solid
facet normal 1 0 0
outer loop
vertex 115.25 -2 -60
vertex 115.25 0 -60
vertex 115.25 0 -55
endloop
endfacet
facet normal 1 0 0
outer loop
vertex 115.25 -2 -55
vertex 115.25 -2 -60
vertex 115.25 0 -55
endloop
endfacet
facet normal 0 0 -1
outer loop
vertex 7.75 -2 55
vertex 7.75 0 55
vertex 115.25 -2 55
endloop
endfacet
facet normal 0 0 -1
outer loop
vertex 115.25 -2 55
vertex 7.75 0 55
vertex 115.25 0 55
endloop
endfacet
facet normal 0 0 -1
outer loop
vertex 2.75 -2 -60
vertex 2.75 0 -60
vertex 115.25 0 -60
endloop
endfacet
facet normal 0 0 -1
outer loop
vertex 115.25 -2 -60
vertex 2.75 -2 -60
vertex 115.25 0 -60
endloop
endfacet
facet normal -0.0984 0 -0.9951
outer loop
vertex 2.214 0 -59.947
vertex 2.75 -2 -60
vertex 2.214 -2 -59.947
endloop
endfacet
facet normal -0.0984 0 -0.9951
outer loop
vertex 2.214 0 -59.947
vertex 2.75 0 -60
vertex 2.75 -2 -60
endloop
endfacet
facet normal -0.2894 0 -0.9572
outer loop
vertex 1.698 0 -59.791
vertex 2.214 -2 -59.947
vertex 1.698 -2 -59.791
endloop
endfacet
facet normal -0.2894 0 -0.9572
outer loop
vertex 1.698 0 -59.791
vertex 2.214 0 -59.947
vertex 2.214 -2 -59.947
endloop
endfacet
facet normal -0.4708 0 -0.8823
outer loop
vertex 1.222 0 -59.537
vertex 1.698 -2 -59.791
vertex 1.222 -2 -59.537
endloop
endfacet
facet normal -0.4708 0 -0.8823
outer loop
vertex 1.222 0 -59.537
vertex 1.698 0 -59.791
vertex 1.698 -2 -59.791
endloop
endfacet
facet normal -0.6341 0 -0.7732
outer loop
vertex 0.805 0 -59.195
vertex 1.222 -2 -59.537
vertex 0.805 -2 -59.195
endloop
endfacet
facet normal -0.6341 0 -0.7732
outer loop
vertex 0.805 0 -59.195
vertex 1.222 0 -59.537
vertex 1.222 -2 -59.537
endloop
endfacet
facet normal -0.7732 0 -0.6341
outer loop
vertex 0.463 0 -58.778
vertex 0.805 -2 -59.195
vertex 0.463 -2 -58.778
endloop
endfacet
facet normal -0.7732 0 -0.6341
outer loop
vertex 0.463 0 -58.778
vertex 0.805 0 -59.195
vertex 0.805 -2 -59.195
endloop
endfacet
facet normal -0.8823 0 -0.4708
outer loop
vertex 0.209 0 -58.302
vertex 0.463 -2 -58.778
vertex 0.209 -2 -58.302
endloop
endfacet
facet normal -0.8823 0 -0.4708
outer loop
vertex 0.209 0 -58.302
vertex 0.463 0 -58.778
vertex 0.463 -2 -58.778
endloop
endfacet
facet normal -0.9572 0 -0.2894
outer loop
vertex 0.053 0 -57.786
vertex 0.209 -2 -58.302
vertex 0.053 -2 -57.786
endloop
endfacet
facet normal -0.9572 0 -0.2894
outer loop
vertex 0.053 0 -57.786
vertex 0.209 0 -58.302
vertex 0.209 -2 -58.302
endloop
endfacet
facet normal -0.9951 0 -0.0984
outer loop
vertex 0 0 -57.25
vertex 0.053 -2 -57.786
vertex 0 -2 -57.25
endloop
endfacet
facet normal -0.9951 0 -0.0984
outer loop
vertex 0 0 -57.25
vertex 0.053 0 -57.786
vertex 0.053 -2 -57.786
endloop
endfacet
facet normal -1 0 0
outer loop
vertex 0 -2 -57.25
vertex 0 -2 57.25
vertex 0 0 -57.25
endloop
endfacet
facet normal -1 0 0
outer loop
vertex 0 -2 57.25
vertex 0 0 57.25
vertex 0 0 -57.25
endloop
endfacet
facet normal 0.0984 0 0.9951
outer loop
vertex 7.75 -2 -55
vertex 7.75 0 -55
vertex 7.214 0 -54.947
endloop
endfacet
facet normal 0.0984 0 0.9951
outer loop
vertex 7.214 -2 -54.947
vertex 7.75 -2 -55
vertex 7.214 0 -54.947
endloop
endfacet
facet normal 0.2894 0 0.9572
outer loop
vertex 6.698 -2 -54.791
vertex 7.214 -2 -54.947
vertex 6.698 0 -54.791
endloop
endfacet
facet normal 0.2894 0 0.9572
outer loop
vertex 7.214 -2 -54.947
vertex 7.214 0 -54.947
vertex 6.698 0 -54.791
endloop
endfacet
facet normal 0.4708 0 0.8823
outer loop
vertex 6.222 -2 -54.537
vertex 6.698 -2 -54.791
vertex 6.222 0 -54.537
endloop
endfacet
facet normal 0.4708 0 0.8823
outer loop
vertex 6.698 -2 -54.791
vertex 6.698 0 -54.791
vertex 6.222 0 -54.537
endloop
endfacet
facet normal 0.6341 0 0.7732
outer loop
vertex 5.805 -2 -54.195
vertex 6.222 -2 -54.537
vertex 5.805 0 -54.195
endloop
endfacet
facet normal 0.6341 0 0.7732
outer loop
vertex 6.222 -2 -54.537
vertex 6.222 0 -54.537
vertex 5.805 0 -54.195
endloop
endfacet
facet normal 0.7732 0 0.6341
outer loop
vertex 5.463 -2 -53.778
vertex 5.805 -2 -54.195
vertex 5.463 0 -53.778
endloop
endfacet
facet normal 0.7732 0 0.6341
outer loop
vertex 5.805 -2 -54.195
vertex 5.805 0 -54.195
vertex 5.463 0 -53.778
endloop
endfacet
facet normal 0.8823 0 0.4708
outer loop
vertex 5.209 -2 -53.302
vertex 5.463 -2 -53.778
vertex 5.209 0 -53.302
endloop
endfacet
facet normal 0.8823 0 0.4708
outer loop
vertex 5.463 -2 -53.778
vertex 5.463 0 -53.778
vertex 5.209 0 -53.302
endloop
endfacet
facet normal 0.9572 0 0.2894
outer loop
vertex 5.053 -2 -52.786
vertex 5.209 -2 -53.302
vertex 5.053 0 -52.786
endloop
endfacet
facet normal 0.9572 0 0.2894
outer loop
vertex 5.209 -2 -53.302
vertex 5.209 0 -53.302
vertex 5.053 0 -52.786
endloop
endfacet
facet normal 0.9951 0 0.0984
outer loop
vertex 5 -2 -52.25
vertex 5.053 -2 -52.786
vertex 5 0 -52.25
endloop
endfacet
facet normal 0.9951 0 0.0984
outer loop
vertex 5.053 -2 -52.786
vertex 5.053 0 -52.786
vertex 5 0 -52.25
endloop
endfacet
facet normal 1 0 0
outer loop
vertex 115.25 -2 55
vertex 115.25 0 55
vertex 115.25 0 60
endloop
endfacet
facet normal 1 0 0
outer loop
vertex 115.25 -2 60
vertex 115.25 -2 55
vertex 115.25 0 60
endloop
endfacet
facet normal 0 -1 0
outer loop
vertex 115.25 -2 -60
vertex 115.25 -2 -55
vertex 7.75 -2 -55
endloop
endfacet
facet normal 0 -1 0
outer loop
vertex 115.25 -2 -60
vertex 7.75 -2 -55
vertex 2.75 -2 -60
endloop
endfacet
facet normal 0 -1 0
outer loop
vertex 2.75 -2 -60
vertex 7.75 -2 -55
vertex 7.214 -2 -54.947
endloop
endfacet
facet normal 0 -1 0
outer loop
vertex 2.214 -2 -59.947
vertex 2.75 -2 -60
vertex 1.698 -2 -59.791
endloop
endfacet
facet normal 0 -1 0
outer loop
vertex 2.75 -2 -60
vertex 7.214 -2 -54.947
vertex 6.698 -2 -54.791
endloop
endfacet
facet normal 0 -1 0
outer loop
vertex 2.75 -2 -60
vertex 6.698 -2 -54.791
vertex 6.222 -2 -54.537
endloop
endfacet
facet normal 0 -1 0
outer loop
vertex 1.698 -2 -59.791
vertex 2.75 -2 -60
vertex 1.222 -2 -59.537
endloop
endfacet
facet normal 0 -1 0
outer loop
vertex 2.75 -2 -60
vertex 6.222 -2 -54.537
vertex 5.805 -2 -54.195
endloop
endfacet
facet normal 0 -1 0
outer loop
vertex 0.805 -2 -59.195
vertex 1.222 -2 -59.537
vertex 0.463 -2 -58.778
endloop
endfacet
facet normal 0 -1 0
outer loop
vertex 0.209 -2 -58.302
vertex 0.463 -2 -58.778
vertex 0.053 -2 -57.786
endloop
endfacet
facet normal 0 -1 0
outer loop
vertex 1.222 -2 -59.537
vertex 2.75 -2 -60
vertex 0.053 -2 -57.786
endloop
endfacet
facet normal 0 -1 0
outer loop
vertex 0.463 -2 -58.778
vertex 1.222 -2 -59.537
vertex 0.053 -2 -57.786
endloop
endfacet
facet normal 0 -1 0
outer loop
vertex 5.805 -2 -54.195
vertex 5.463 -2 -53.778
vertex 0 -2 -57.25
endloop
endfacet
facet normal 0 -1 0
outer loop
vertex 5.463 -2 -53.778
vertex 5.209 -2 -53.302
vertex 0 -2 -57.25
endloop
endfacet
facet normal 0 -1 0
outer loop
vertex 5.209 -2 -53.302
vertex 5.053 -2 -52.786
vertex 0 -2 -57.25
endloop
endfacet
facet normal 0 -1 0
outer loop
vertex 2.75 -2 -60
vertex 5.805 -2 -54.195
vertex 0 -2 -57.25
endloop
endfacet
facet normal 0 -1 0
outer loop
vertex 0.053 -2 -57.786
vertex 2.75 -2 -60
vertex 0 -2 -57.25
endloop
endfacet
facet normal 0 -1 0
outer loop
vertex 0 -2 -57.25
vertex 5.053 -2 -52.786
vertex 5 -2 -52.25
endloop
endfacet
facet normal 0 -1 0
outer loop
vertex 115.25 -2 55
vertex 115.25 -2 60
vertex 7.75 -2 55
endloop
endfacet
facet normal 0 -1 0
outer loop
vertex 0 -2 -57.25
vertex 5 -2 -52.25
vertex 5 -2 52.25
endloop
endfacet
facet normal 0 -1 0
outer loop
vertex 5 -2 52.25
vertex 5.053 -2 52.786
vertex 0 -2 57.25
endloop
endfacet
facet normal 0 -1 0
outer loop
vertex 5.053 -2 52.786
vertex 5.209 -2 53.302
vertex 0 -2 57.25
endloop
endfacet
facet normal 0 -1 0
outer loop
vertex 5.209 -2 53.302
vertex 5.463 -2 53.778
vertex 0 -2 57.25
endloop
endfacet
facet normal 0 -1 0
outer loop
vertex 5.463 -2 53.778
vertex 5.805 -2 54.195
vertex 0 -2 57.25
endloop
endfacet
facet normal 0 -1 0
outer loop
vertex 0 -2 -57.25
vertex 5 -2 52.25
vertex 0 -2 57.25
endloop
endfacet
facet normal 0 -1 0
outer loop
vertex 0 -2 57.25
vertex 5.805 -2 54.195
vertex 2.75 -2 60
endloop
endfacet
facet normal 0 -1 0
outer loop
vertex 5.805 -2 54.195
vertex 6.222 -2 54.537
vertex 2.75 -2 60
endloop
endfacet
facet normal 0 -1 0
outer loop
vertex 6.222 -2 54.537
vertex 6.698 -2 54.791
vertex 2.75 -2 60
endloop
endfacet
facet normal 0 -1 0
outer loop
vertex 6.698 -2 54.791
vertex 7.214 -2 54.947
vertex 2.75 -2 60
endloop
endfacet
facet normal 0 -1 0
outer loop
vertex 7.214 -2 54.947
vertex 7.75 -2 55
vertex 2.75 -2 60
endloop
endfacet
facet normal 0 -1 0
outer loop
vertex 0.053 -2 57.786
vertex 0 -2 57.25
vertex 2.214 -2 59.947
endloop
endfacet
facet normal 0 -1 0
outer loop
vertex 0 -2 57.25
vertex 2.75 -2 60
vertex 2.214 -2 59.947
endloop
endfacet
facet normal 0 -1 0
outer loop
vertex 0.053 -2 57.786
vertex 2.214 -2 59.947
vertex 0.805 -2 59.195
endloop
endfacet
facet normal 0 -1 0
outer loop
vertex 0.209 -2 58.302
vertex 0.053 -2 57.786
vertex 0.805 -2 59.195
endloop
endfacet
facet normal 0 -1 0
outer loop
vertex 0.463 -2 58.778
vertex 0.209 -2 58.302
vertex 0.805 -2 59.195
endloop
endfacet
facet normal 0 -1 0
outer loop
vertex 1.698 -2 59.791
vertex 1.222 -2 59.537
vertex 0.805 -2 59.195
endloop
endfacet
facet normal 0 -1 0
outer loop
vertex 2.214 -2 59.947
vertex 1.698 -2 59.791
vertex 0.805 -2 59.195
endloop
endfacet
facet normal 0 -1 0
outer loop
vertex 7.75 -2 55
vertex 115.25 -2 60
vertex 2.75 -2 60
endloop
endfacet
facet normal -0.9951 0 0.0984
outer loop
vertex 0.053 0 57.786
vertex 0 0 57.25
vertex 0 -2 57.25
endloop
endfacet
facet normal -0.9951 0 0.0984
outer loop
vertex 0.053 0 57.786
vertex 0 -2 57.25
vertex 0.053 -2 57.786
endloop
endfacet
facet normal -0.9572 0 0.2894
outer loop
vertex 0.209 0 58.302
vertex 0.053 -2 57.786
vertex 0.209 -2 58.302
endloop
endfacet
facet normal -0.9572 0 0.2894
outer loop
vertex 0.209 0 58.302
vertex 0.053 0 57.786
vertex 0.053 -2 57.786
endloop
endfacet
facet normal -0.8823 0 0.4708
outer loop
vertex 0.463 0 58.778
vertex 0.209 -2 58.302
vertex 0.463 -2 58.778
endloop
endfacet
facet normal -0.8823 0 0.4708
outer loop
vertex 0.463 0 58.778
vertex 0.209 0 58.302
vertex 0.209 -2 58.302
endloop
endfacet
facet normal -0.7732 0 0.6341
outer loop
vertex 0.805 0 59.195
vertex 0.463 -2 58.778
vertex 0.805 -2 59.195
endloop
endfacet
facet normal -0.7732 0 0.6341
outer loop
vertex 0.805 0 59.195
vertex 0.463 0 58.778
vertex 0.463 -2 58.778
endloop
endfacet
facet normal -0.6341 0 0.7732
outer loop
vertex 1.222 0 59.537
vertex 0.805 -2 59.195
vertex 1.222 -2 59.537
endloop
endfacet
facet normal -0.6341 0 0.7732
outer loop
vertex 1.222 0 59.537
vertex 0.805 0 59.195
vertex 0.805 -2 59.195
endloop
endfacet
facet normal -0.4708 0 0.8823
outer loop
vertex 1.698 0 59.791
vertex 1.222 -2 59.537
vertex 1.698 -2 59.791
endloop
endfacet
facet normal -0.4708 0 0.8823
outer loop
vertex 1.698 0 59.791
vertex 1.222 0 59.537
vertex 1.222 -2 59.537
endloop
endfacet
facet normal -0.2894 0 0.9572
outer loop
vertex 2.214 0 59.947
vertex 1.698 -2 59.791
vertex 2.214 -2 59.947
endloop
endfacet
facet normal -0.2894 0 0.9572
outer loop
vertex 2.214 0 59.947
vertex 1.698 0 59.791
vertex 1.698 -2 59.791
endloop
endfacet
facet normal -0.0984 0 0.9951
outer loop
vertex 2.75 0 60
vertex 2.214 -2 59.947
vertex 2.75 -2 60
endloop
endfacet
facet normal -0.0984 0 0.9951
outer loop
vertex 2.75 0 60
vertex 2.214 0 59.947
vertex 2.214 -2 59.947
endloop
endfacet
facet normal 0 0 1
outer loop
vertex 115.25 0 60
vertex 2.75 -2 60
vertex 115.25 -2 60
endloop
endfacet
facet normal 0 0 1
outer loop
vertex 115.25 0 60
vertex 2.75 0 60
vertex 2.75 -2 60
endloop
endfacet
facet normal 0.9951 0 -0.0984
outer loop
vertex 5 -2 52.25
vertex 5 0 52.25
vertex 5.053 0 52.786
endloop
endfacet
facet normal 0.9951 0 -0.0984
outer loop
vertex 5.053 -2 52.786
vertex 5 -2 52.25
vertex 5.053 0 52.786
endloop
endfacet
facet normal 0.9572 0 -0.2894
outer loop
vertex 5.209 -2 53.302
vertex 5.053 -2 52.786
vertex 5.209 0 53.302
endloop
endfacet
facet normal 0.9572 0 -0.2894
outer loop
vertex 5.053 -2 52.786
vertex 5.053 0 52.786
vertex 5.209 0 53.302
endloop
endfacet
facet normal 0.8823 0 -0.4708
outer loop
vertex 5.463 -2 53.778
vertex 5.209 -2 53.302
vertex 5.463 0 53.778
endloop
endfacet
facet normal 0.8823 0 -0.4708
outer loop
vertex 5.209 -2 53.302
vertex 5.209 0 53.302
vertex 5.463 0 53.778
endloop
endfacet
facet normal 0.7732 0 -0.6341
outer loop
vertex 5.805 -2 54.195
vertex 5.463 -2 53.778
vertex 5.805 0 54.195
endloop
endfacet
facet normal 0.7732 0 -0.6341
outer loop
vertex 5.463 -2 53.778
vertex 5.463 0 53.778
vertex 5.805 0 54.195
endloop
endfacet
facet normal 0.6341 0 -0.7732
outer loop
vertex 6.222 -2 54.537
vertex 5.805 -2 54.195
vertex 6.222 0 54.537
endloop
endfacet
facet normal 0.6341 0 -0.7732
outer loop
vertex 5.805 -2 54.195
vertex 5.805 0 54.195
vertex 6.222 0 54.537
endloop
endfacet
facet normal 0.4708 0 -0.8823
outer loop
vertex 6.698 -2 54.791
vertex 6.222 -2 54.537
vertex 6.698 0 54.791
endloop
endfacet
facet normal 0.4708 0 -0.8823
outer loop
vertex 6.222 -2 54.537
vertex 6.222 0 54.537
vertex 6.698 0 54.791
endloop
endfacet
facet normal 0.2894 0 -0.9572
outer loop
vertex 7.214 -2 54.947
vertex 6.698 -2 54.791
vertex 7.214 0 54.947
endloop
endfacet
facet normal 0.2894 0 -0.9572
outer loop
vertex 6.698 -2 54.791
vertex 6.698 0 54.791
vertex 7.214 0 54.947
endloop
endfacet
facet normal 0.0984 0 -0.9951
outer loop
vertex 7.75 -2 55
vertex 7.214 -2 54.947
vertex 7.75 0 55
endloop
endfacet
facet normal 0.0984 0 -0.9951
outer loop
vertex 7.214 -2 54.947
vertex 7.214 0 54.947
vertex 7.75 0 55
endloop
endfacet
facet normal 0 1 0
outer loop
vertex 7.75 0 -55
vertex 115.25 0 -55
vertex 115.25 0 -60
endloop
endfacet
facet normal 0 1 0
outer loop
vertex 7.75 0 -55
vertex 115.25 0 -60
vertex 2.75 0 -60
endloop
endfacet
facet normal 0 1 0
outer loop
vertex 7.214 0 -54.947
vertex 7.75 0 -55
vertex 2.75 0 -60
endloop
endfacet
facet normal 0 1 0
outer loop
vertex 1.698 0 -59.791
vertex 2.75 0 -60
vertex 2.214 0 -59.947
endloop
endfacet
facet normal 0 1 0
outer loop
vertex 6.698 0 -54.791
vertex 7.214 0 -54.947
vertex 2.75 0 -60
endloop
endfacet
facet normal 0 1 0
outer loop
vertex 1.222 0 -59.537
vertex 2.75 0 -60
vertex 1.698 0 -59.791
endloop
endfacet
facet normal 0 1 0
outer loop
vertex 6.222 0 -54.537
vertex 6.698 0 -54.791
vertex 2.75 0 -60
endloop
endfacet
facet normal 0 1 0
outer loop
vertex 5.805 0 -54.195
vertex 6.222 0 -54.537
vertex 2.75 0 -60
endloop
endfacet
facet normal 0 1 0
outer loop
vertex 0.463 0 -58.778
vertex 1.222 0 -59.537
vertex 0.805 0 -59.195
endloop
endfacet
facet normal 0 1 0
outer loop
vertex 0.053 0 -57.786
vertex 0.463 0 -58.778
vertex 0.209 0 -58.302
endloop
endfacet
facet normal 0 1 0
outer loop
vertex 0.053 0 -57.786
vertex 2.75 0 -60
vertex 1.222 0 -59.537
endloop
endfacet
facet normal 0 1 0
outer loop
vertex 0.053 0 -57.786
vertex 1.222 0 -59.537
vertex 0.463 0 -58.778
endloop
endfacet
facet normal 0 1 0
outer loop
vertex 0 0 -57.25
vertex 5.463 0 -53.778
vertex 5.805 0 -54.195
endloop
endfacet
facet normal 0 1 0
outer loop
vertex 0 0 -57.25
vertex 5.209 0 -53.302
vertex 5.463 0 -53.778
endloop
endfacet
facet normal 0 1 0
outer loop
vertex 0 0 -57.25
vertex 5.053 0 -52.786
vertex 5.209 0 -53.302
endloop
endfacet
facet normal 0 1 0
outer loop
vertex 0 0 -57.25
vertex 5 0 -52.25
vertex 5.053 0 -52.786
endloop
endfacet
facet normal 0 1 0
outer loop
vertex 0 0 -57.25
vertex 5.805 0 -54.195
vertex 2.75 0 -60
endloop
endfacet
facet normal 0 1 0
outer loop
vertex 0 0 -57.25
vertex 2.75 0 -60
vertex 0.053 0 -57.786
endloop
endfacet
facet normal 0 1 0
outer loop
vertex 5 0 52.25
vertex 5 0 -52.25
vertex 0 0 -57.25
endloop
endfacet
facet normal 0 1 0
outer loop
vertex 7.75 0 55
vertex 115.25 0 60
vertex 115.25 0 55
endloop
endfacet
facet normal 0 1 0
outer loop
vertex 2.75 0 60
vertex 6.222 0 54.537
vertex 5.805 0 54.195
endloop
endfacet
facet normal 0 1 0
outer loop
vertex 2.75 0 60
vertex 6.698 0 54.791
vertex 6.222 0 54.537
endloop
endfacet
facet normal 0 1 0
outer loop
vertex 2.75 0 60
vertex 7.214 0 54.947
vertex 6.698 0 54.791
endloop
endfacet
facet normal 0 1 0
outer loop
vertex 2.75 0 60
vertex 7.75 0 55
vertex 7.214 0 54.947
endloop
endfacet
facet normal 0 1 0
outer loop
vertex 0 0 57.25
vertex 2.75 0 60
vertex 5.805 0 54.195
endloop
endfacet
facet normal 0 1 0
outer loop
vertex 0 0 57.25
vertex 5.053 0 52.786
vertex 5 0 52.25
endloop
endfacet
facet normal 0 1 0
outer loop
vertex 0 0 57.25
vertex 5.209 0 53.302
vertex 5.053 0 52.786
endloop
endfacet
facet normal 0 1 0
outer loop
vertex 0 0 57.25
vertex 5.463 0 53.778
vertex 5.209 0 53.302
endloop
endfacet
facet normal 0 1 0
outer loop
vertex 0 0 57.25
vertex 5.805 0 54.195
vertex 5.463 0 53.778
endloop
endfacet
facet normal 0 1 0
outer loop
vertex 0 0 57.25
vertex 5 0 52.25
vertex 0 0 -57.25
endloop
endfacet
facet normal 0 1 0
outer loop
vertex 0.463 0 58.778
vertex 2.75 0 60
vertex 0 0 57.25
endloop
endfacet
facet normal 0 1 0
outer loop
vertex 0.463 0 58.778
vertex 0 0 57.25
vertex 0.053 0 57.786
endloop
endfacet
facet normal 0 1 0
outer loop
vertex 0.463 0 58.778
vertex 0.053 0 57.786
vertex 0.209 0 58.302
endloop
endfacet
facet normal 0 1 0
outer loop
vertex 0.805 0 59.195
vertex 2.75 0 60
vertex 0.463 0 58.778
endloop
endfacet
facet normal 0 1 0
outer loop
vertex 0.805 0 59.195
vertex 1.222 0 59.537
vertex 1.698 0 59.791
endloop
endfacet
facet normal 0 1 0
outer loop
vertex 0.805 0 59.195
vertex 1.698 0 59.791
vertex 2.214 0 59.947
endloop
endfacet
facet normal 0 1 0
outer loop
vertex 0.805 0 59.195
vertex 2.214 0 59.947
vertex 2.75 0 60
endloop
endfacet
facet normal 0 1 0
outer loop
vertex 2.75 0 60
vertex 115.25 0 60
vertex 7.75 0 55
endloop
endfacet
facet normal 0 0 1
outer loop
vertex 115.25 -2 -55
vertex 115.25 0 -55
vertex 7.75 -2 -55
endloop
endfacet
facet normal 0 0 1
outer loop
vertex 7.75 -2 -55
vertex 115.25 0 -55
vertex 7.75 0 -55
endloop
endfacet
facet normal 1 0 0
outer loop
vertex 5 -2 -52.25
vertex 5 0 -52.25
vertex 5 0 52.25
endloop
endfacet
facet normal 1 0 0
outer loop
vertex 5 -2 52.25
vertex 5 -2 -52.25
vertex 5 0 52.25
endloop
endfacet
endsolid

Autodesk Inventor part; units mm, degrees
ref_plane "YZ Plane" through (0, 0, 0) normal (1, 0, 0) x (0, 1, 0)
ref_plane "XZ Plane" through (0, 0, 0) normal (0, 1, 0) x (-1, 0, 0)
ref_plane "XY Plane" through (0, 0, 0) normal (0, 0, 1) x (1, 0, 0)
sketch "Sketch1" plane through (0, 0, 0) normal (0, 1, 0) x (-1, 0, 0)
  line L0 (0, 60) -> (0, 57.25) construction
  line L1 (0, 60) -> (-2.75, 60) construction
  line L2 (0, -60) -> (-2.75, -60) construction
  line L3 (-115.25, -55) -> (-7.75, -55)
  line L4 (-5, -55) -> (-5, -52.25) construction
  line L5 (-5, 55) -> (-7.75, 55) construction
  line L6 (-115.25, 55) -> (-115.25, 60)
  line L7 (-115.25, -60) -> (-115.25, -55)
  arc A0 (-5, 52.25) -> (-7.75, 55) centre (-7.75, 52.25) ccw
  arc A1 (-7.75, -55) -> (-5, -52.25) centre (-7.75, -52.25) ccw
  arc A2 (0, 57.25) -> (-2.75, 60) centre (-2.75, 57.25) ccw
  arc A3 (-2.75, -60) -> (0, -57.25) centre (-2.75, -57.25) ccw
  line L8 (0, 57.25) -> (0, -57.25)
  line L9 (-2.75, 60) -> (-115.25, 60)
  line L10 (0, -57.25) -> (0, -60) construction
  line L11 (-2.75, -60) -> (-115.25, -60)
  line L12 (-5, -52.25) -> (-5, 52.25)
  line L13 (-7.75, -55) -> (-5, -55) construction
  line L14 (-5, 52.25) -> (-5, 55) construction
  line L15 (-7.75, 55) -> (-115.25, 55)
  arc A4 (-2.75, 60) -> (0, 57.25) centre (-2.75, 57.25) ccw construction
  arc A5 (-7.75, 55) -> (-5, 52.25) centre (-7.75, 52.25) ccw construction
  arc A6 (0, -57.25) -> (-2.75, -60) centre (-2.75, -57.25) ccw construction
  arc A7 (-5, -52.25) -> (-7.75, -55) centre (-7.75, -52.25) ccw construction
  point P0 (0, 0)
  point P1 (0, 0)
  dimension "d4" = 5
  dimension "d6" = 115.25
  dimension "d8" = 115.25
  dimension "d9" = 5
  dimension "d10" = 5
  dimension "d11" = 120
  dimension "d12" = 55
  dimension "d13" = 5.5
extrude "Plate1" add sketch "Sketch1" against normal blind 2
equation "\"d8\" = d6"
equation "\"d9\" = d4"
equation "\"d10\" = d4"
equation "\"d11\" = Ширина_крепления_корпуса"
equation "\"d5\" = Thickness"
equation "\"BendReliefWidth\" = Thickness"
equation "\"BendReliefDepth\" = 0.5 * Thickness"
equation "\"CornerReliefSize\" = 4 * Thickness"
equation "\"MinimumRemnant\" = 2 * Thickness"
equation "\"TransitionRadius\" = BendRadius"
equation "\"JacobiRadiusSize\" = BendRadius"
equation "\"GapSize\" = Thickness"
equation "\"Ширина_крепления_корпуса\" = 120"
equation "\"Thickness\" = 2"
equation "\"BendRadius\" = 2.75"
properties part number "Опоры на кожухе 2" material "Stainless Steel"
